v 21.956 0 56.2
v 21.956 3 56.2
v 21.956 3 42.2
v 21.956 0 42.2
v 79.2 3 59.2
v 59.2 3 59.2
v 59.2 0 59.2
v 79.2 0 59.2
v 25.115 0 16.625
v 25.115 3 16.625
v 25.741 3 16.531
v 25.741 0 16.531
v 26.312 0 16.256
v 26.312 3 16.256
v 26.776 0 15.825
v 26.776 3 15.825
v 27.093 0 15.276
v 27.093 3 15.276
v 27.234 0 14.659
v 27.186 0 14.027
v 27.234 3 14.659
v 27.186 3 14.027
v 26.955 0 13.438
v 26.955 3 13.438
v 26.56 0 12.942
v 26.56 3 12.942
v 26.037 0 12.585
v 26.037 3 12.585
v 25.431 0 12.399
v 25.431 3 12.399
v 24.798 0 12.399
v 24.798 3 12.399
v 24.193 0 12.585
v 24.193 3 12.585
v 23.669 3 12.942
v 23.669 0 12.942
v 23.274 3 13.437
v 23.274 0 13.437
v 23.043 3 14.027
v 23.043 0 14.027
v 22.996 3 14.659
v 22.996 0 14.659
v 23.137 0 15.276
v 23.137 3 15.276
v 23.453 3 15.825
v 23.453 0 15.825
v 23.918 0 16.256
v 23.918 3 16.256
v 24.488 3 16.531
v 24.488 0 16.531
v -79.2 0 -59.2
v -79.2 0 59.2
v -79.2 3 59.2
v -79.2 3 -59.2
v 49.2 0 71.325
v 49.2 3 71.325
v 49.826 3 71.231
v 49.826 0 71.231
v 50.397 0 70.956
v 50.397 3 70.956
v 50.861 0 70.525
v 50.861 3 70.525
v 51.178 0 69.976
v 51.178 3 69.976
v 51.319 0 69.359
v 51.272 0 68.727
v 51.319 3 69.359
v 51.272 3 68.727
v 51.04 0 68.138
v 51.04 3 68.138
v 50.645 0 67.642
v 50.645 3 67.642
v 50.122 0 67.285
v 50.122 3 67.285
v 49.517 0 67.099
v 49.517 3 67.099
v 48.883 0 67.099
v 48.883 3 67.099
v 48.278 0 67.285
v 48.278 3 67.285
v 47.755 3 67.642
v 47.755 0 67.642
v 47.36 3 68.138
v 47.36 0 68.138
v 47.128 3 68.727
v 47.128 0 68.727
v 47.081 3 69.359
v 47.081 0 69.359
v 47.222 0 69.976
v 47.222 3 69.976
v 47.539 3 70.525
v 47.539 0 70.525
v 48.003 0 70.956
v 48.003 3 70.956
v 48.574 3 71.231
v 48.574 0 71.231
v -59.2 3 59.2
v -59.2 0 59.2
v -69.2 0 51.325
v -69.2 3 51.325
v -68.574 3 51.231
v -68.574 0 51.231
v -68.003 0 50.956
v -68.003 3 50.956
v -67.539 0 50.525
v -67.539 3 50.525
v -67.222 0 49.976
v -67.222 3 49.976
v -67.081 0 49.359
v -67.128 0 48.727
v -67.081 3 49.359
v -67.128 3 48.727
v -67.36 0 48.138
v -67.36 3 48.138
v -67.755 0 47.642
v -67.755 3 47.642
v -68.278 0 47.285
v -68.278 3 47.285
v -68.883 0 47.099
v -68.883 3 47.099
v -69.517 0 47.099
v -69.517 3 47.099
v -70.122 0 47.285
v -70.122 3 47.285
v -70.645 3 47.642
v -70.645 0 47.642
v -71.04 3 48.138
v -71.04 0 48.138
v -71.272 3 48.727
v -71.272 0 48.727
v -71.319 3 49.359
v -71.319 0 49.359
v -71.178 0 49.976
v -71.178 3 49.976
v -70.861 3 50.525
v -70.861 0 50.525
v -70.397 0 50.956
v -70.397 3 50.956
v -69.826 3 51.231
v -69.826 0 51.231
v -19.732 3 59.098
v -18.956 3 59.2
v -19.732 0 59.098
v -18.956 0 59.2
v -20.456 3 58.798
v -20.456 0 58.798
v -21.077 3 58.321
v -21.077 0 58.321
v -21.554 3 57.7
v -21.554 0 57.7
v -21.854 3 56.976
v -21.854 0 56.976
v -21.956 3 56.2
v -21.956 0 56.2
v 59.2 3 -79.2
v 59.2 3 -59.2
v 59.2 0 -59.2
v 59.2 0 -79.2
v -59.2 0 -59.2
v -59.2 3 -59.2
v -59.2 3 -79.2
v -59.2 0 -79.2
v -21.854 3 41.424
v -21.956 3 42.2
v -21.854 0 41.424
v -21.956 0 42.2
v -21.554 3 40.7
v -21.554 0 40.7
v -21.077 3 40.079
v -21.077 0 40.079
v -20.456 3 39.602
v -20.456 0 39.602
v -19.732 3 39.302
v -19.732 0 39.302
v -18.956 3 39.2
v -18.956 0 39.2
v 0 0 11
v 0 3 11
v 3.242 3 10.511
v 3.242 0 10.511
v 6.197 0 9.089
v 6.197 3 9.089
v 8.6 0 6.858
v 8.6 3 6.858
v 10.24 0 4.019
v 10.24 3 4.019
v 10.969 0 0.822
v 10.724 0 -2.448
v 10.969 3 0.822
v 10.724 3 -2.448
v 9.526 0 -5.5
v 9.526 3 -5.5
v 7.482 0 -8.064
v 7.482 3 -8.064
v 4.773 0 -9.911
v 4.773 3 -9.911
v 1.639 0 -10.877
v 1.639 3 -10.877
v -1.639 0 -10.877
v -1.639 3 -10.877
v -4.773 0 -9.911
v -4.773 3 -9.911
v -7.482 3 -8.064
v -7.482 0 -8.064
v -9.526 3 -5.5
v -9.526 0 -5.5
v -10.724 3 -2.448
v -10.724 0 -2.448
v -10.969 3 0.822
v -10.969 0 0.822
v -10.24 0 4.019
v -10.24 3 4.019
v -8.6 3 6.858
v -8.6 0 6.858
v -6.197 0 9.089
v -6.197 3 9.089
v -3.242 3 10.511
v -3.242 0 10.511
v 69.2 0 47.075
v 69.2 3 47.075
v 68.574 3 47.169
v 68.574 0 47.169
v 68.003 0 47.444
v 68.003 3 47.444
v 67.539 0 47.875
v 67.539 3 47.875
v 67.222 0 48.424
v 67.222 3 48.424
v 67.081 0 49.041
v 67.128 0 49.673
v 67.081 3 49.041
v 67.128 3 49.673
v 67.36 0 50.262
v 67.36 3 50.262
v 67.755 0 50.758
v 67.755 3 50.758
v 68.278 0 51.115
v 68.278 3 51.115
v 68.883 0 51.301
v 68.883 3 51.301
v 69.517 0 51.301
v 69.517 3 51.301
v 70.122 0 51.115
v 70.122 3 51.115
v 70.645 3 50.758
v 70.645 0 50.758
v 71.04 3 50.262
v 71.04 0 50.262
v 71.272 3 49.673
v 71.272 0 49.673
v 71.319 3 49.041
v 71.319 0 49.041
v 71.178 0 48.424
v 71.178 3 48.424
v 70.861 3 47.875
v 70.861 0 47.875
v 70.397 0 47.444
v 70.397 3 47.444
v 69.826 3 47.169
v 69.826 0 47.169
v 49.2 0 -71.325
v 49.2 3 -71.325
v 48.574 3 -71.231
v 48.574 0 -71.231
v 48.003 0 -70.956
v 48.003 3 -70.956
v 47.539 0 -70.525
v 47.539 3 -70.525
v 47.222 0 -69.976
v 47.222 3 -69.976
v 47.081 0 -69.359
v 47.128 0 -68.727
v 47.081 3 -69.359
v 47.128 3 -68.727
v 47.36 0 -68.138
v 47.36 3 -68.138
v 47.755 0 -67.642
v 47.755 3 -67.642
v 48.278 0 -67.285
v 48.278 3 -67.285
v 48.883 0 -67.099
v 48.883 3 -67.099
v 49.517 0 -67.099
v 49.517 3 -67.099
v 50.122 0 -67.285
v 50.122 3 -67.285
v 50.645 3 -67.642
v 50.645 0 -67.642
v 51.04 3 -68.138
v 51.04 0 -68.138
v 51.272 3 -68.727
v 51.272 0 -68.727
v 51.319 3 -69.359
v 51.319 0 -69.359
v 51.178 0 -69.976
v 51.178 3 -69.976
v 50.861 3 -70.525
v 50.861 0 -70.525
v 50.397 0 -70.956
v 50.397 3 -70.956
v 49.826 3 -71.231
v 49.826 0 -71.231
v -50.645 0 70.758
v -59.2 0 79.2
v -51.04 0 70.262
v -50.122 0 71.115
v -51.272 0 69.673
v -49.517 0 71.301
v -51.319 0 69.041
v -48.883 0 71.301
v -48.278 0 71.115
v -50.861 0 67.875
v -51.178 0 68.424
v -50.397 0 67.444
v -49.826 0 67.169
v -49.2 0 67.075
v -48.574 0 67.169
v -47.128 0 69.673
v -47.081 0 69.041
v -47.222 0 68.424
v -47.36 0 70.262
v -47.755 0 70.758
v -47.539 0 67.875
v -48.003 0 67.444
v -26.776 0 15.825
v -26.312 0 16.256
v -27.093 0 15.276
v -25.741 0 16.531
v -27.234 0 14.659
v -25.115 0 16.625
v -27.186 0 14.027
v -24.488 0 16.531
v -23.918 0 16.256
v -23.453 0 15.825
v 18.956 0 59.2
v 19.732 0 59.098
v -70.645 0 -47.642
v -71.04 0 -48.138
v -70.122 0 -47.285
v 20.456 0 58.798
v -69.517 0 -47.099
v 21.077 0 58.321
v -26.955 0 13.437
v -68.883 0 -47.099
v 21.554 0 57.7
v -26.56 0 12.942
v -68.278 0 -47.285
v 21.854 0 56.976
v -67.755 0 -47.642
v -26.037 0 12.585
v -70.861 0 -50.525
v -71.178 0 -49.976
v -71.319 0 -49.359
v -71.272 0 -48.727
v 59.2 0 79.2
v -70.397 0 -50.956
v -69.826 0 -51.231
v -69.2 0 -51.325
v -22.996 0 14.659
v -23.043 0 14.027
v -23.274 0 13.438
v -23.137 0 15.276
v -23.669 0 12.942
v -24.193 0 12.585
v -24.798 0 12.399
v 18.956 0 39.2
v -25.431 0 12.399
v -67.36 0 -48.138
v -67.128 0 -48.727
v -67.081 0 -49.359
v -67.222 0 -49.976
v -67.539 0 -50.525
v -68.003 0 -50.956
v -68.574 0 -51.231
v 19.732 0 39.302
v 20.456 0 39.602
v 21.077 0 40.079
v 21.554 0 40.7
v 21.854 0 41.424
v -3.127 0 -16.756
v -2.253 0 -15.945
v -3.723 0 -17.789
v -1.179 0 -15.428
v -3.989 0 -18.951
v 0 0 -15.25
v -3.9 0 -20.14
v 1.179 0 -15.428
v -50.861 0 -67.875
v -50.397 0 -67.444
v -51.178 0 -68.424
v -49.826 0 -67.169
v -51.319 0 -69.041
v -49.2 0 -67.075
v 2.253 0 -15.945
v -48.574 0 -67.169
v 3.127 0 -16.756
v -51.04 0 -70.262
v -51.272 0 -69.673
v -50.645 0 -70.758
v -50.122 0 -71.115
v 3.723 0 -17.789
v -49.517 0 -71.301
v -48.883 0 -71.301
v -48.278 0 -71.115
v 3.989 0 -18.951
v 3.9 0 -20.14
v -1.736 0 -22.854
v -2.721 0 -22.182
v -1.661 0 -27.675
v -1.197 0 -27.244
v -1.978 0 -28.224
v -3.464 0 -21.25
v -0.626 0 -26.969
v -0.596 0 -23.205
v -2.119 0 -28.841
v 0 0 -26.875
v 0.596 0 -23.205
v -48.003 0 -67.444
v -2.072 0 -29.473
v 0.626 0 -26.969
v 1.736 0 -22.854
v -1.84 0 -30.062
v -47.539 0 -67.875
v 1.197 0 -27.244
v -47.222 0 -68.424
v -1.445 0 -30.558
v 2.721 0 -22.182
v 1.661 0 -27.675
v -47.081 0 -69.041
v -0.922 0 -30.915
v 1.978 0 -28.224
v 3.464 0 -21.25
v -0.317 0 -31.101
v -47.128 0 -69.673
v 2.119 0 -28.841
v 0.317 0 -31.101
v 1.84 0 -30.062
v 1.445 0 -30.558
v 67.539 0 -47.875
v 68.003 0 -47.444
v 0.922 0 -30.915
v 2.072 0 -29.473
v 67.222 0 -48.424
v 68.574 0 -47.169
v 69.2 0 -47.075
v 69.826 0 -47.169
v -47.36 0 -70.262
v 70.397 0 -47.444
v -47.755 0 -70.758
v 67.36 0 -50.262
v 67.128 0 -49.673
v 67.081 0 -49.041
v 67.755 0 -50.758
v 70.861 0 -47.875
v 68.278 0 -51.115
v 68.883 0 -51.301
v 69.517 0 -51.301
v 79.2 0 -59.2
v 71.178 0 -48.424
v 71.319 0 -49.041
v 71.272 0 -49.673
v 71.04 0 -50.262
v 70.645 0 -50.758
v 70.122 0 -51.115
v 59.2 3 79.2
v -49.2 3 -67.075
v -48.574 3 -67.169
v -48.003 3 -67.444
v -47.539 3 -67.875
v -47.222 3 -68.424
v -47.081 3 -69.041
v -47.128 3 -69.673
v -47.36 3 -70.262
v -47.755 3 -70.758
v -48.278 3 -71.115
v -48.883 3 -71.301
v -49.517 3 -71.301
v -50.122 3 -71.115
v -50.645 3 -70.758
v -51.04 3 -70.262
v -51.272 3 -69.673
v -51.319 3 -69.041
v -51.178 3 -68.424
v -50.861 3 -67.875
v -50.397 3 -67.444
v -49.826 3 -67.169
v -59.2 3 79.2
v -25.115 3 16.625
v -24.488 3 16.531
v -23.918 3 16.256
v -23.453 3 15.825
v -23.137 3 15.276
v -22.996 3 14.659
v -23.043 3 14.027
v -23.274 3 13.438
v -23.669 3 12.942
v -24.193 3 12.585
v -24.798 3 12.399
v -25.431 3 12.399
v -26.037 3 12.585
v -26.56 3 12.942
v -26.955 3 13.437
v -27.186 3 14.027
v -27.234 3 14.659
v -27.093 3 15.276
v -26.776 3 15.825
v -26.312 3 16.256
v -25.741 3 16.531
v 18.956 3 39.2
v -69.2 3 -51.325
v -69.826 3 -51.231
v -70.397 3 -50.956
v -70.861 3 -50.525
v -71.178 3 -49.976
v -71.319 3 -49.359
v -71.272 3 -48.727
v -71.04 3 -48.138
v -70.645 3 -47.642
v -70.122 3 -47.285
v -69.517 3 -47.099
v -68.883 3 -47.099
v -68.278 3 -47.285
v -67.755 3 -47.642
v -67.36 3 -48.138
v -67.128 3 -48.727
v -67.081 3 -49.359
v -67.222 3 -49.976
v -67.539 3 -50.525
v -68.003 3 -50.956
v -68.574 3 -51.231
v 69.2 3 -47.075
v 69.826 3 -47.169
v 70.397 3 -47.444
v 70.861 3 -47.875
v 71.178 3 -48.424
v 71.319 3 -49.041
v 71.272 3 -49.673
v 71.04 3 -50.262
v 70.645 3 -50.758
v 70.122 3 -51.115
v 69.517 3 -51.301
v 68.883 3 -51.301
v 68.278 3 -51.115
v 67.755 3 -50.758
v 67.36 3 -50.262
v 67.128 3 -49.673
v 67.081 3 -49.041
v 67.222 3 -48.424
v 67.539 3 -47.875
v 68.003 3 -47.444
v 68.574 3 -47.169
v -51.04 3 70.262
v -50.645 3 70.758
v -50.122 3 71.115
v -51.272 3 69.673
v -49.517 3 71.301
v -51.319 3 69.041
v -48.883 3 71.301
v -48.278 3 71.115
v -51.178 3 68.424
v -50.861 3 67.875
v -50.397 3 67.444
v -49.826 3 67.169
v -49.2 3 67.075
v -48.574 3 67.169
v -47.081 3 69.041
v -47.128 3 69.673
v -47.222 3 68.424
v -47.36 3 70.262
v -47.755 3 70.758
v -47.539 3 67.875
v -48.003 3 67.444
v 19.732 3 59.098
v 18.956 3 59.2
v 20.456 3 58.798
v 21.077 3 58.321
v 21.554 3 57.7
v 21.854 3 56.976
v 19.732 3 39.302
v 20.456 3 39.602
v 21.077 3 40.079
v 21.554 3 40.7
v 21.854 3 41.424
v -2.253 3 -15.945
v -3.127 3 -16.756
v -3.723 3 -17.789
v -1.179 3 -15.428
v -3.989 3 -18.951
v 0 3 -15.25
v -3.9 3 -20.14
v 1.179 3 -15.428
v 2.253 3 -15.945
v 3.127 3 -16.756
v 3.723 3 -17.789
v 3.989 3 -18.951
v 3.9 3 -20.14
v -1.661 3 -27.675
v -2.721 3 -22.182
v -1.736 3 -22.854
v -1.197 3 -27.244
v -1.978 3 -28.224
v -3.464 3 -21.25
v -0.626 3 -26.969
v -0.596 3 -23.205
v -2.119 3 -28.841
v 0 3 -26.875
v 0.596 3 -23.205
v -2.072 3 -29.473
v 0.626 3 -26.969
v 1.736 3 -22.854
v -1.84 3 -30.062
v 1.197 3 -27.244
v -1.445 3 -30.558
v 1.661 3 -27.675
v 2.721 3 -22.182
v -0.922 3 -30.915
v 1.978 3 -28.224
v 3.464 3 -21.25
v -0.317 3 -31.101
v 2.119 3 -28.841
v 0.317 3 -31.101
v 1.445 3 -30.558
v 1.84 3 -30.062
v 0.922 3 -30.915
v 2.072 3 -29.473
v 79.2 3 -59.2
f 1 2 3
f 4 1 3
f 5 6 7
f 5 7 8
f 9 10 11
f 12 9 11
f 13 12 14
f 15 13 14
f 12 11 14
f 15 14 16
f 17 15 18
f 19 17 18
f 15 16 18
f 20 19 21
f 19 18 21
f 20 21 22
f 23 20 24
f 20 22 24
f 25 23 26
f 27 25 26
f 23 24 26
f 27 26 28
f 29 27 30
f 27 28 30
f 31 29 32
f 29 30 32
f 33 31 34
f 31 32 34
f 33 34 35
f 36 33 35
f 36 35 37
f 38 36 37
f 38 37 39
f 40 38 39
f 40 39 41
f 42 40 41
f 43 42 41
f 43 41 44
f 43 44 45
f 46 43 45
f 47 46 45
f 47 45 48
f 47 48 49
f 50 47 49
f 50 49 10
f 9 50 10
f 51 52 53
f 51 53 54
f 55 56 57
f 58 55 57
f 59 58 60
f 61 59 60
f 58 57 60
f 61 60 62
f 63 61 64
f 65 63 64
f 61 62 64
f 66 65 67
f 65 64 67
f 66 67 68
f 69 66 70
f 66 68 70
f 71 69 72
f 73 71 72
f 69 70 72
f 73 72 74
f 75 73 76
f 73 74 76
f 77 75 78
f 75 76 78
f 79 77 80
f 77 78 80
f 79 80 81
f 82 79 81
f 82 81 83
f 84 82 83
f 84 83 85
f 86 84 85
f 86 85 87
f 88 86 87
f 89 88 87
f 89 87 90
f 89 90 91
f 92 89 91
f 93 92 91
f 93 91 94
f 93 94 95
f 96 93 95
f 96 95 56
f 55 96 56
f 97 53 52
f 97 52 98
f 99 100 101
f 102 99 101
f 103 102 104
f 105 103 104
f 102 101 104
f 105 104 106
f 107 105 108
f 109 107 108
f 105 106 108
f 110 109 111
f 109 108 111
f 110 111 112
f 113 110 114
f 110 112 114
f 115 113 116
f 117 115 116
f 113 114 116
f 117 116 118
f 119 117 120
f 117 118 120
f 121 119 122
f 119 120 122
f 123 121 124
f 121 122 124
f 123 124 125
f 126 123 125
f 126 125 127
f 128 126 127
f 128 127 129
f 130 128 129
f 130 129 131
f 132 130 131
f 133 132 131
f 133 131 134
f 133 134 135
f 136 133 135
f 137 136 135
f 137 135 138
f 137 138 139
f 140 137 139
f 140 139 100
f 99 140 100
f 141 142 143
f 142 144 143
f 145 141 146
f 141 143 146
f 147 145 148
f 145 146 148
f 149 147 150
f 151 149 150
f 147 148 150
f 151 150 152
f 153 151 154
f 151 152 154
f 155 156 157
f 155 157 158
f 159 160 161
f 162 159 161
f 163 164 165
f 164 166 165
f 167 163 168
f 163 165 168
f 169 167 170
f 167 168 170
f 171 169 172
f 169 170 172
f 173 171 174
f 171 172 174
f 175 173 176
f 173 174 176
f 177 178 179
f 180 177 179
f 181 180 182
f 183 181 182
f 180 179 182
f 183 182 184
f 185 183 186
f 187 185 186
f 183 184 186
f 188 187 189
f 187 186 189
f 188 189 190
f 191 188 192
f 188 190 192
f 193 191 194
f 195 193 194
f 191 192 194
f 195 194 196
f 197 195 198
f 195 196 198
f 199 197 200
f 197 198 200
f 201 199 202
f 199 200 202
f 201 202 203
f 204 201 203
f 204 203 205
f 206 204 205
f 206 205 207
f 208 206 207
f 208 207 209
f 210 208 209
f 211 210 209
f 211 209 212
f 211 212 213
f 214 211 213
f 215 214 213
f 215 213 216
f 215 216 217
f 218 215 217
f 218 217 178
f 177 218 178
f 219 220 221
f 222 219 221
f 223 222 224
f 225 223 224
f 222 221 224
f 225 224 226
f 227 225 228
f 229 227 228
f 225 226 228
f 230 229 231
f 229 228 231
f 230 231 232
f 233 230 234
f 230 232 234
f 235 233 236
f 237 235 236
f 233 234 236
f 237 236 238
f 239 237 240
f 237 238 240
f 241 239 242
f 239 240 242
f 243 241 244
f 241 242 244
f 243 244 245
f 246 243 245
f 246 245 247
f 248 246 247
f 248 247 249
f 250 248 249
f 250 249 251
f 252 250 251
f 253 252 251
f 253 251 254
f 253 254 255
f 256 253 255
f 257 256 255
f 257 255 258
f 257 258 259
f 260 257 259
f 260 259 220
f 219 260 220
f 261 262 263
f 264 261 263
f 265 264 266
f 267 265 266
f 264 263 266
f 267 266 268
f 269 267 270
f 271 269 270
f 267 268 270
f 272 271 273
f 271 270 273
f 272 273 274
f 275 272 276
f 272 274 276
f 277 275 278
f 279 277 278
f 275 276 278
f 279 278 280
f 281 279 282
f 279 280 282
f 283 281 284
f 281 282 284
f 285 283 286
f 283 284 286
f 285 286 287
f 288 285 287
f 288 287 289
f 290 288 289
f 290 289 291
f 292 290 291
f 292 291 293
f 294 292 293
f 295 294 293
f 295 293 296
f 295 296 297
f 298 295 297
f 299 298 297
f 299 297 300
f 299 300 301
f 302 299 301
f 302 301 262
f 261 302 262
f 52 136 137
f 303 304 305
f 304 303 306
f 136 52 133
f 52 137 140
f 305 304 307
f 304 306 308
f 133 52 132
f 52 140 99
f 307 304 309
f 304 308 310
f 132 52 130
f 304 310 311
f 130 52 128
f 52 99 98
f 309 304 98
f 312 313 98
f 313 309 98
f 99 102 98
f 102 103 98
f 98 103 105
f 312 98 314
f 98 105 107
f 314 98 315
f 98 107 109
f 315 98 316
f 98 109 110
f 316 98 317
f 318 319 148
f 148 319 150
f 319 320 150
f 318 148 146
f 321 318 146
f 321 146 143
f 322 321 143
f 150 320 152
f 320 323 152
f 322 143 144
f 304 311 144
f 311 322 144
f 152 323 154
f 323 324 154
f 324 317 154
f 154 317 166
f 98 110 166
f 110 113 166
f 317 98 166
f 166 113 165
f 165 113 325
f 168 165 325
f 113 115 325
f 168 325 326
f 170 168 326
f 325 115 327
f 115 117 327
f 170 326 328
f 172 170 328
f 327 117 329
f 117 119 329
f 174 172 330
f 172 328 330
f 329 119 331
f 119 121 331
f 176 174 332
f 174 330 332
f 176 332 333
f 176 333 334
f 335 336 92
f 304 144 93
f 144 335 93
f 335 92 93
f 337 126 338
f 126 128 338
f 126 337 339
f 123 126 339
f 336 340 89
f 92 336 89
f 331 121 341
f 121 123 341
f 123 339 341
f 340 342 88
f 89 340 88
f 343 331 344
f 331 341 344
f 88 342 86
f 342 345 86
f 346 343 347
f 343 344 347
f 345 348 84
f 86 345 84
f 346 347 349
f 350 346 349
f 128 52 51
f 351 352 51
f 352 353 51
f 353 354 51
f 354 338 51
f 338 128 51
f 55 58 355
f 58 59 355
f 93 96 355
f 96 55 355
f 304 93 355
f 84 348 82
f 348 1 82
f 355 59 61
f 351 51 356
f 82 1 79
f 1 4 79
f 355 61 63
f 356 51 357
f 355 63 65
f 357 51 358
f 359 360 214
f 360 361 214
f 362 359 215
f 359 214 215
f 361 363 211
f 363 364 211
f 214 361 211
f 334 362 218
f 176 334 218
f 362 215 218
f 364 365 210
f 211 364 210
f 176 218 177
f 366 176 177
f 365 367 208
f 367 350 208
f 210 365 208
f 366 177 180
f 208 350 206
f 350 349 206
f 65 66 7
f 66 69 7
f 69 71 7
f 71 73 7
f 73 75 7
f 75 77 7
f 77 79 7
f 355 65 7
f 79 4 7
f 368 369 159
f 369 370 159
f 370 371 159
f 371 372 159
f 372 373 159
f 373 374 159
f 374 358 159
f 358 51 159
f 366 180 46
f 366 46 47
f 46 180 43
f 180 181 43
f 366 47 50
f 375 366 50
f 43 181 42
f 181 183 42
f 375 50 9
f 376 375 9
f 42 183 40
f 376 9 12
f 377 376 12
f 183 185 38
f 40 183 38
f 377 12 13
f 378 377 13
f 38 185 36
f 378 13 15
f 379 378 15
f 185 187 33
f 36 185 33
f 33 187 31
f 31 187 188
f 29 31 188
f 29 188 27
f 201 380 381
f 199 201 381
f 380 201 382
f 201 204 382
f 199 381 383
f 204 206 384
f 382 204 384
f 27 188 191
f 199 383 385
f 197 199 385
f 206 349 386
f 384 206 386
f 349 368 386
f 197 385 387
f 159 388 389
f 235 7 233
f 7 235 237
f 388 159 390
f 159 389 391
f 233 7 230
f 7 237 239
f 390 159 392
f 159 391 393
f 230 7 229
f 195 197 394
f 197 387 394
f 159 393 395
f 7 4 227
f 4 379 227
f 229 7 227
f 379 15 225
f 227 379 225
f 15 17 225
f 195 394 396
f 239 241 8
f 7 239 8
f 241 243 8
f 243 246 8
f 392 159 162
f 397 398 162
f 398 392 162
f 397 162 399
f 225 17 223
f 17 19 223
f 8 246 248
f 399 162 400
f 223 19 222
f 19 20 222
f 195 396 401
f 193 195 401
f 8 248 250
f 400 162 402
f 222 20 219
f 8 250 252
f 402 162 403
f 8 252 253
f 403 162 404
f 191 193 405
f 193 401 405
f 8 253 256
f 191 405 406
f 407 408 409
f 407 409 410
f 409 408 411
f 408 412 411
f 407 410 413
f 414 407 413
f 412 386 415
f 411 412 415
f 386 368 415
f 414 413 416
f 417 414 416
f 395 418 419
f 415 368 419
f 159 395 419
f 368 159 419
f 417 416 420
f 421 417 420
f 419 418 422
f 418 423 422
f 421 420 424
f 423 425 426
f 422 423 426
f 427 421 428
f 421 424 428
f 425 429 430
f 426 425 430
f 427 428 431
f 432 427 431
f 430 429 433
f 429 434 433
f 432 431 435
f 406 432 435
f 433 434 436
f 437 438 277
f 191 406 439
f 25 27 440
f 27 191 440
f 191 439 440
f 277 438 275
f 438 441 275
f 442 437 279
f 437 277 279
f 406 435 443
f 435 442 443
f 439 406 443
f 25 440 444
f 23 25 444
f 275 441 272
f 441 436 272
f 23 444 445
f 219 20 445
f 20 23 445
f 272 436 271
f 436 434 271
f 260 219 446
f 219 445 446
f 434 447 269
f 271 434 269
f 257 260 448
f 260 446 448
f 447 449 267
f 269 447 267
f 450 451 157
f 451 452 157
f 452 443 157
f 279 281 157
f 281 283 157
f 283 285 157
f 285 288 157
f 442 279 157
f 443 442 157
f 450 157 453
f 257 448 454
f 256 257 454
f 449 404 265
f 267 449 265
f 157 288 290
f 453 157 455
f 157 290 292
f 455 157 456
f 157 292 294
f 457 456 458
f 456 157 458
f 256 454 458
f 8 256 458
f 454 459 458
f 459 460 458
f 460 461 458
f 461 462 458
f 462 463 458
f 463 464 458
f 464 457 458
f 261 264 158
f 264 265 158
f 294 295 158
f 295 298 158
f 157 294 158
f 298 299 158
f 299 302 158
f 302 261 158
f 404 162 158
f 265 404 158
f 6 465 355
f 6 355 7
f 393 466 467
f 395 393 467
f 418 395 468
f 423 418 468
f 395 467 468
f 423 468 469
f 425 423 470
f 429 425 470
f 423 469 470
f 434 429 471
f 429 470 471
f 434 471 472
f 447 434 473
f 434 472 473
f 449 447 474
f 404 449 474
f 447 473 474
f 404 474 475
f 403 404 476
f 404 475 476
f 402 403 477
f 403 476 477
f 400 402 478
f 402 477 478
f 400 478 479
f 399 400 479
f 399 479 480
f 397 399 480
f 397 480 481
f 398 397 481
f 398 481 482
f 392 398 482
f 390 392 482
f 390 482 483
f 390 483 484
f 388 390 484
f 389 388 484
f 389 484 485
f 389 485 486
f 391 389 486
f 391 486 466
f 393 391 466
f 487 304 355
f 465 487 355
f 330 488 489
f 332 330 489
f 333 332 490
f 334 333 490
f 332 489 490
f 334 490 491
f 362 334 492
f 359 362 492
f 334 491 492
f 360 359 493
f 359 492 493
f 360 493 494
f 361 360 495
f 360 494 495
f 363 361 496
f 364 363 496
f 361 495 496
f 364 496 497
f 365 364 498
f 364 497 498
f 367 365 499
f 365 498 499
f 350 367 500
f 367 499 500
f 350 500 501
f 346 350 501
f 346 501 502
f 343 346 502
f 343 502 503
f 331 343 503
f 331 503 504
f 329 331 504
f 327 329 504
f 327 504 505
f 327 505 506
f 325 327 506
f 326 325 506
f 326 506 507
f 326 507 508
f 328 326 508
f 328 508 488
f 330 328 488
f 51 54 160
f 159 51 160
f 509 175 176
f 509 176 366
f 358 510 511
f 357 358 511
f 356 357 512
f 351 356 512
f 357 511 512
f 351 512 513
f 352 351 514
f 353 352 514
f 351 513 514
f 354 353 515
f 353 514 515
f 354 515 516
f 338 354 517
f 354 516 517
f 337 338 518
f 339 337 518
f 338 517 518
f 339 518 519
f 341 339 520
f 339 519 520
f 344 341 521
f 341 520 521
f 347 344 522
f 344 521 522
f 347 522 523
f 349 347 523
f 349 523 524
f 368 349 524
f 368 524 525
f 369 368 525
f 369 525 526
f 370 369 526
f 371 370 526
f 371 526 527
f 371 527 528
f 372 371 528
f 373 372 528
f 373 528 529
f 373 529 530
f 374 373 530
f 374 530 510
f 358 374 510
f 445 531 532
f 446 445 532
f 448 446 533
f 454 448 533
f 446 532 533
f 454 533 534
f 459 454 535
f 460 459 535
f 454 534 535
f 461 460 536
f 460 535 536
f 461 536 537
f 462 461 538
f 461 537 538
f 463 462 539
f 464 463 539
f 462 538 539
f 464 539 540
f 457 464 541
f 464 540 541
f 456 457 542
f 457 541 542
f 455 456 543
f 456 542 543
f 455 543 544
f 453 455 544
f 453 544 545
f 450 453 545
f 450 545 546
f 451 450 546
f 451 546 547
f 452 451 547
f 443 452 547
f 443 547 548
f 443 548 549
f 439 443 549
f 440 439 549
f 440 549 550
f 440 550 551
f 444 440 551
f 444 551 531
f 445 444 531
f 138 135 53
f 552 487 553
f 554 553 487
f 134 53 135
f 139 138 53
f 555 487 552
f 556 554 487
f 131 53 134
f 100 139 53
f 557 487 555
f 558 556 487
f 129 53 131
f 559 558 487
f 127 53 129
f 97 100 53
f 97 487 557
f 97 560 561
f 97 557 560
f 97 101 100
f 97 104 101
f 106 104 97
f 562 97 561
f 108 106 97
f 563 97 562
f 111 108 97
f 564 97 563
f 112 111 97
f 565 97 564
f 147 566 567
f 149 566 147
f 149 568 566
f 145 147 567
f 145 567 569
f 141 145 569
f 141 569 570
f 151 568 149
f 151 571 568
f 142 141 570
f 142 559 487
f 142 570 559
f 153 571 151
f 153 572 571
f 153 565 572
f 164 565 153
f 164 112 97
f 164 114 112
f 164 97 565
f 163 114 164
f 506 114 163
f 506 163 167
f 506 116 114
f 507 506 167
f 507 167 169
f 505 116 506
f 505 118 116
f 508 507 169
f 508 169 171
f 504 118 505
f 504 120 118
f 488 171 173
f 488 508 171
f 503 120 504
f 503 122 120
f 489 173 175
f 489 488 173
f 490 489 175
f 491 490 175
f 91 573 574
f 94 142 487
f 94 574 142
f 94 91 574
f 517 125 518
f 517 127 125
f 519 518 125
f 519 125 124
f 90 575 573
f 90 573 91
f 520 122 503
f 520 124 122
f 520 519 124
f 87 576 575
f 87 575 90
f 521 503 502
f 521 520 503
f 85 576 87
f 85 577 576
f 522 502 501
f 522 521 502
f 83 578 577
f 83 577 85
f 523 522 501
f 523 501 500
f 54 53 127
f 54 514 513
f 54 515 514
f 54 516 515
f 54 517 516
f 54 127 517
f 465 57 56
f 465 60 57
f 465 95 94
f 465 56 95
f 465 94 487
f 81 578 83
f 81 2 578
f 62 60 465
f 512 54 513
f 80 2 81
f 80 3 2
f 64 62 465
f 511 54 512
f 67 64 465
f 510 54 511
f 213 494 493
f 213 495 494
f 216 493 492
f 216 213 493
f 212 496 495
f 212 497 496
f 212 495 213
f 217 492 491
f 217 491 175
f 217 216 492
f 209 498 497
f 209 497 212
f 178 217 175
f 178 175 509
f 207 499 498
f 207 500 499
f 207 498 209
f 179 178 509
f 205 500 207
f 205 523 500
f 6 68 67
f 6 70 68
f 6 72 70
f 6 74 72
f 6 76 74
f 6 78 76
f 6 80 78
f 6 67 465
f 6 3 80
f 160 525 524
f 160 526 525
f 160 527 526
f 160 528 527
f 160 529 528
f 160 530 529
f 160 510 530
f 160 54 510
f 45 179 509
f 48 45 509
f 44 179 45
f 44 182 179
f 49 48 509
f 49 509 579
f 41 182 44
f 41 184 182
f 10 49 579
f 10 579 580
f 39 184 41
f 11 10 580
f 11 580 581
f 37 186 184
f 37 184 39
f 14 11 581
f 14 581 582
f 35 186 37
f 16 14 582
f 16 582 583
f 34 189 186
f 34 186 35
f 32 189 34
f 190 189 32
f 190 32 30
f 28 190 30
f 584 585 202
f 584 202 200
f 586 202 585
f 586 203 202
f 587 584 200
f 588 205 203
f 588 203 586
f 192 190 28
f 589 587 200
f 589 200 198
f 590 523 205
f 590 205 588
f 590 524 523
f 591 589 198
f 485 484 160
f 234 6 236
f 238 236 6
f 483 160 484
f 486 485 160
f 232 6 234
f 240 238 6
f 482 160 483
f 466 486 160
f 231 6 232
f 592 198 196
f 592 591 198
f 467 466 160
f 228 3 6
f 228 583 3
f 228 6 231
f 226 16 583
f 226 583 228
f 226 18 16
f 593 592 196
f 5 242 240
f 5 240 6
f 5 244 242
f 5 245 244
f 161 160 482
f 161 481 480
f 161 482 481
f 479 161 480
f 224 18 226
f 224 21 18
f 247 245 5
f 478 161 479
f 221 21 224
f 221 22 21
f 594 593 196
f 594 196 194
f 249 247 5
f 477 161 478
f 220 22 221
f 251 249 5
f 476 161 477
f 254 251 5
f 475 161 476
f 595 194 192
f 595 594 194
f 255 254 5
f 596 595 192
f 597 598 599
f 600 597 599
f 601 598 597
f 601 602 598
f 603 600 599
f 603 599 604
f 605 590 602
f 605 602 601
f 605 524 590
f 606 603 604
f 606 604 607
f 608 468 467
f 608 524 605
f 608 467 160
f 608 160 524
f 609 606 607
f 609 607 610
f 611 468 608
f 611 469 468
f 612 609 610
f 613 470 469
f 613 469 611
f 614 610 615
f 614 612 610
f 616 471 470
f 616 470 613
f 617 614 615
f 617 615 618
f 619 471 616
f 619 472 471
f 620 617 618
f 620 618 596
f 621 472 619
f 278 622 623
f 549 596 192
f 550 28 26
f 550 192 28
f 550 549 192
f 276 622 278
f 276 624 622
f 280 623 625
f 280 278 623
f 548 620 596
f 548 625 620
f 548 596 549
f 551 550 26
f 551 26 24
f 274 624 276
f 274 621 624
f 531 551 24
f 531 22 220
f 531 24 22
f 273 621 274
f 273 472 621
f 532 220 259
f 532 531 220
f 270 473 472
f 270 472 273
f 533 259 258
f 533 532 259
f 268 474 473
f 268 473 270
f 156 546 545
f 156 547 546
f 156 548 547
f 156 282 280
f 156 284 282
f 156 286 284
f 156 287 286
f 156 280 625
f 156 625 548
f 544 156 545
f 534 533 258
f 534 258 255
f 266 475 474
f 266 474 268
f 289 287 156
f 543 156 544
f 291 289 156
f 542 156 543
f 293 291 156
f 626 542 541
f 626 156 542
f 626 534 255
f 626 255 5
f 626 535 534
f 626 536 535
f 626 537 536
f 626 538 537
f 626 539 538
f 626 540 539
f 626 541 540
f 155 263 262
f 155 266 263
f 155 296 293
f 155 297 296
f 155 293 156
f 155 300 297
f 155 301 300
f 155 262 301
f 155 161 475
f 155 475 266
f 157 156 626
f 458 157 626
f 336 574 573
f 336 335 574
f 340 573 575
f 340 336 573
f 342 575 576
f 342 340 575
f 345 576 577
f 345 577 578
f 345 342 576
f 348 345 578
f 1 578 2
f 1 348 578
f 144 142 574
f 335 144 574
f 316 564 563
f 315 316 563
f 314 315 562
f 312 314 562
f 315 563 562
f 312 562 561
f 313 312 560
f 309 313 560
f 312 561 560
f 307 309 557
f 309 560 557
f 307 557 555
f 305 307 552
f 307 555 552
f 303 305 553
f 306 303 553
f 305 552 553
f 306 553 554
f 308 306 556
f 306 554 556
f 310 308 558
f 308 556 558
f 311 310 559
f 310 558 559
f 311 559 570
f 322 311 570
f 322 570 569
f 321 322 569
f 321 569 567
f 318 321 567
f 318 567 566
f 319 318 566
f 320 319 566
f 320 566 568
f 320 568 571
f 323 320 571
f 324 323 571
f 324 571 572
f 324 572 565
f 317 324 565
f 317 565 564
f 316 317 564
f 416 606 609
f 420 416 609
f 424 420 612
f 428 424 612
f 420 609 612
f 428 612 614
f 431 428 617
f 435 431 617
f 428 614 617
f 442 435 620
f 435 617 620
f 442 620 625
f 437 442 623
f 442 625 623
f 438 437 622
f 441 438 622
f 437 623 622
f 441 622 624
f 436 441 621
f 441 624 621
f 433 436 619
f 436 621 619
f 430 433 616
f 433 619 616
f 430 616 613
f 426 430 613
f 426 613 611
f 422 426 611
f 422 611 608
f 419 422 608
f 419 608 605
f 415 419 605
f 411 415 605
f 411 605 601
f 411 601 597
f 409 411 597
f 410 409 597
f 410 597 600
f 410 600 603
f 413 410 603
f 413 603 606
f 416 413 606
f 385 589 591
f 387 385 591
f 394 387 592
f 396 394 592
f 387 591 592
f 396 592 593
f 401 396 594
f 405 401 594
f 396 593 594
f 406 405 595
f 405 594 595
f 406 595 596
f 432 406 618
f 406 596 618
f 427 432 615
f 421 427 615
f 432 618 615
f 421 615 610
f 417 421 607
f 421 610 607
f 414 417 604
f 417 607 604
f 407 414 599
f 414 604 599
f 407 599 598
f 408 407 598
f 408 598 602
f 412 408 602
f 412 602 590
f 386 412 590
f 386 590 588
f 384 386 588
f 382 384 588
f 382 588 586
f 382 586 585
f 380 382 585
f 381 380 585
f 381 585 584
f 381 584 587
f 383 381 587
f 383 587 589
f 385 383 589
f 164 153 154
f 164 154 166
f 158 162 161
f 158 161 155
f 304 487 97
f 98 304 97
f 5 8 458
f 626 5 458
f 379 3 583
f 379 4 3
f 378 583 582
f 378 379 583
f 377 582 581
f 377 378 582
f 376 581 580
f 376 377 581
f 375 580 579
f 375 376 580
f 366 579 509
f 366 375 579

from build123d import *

# Parameters (mm, degrees)
SKETCH1_W           = 158.4
SKETCH1_H           = 158.4
BOSS_EXTRUDE1_DEPTH = 3
SKETCH2_R           = 2.125
SKETCH2_R_2         = 11
SKETCH2_R_3         = 4
SKETCH2_W           = 43.911972264
SKETCH2_H           = 20
CUT_EXTRUDE3_DEPTH  = 113.045883459
SKETCH3_W           = 20
SKETCH3_H           = 20
CUT_EXTRUDE4_DEPTH  = 113.045883459
FILLET1_R           = 3


with BuildPart() as part:
    # Sketch1 → Boss-Extrude1 (new body)
    with BuildSketch(Plane(origin=(0, 0, 0), x_dir=(1, 0, 0), z_dir=(0, 1, 0))):
        Rectangle(SKETCH1_W, SKETCH1_H)
    extrude(amount=BOSS_EXTRUDE1_DEPTH)

    # Sketch2 → Cut-Extrude3 (cut, through all)
    with BuildSketch(Plane(origin=(0, 3, 0), x_dir=(1, 0, 0), z_dir=(0, 1, 0))):
        with Locations(Location((-69.2, -49.2, 0), (0, 0, 270))):
            Circle(SKETCH2_R)
        with Locations(Location((-69.2, 49.2, 0), (0, 0, 90))):
            Circle(SKETCH2_R)
        with Locations(Location((-49.2, 69.2, 0), (0, 0, 270))):
            Circle(SKETCH2_R)
        with Locations(Location((49.2, 69.2, 0), (0, 0, 90))):
            Circle(SKETCH2_R)
        with Locations(Location((69.2, 49.2, 0), (0, 0, 270))):
            Circle(SKETCH2_R)
        with Locations(Location((69.2, -49.2, 0), (0, 0, 90))):
            Circle(SKETCH2_R)
        with Locations(Location((49.2, -69.2, 0), (0, 0, 270))):
            Circle(SKETCH2_R)
        with Locations(Location((-49.2, -69.2, 0), (0, 0, 90))):
            Circle(SKETCH2_R)
        with Locations(Location((0, 0, 0), (0, 0, 270))):
            Circle(SKETCH2_R_2)
        with Locations(Location((0, 29, 0), (0, 0, 270))):
            Circle(SKETCH2_R)
        with Locations(Location((25.11473671, -14.5, 0), (0, 0, 270))):
            Circle(SKETCH2_R)
        with Locations(Location((-25.11473671, -14.5, 0), (0, 0, 270))):
            Circle(SKETCH2_R)
        with Locations(Location((0, 19.25, 0), (0, 0, 270))):
            Circle(SKETCH2_R_3)
        with Locations((0, -49.2)):
            Rectangle(SKETCH2_W, SKETCH2_H)
    extrude(amount=-CUT_EXTRUDE3_DEPTH, mode=Mode.SUBTRACT)

    # Sketch3 → Cut-Extrude4 (cut, through all)
    with BuildSketch(Plane(origin=(0, 3, 0), x_dir=(1, 0, 0), z_dir=(0, 1, 0))):
        with Locations((69.2, 69.2)):
            Rectangle(SKETCH3_W, SKETCH3_H)
        with Locations((-69.2, 69.2)):
            Rectangle(SKETCH3_W, SKETCH3_H)
        with Locations((69.2, -69.2)):
            Rectangle(SKETCH3_W, SKETCH3_H)
        with Locations((-69.2, -69.2)):
            Rectangle(SKETCH3_W, SKETCH3_H)
    extrude(amount=-CUT_EXTRUDE4_DEPTH, mode=Mode.SUBTRACT)

    # Fillet1
    fillet1_edges = [part.edges().sort_by_distance(p)[0] for p in [
        (21.955986132, 1.5, 39.2),
        (21.955986132, 1.5, 59.2),
        (-21.955986132, 1.5, 59.2),
        (-21.955986132, 1.5, 39.2),
    ]]
    fillet(fillet1_edges, radius=FILLET1_R)


solid = part.part
